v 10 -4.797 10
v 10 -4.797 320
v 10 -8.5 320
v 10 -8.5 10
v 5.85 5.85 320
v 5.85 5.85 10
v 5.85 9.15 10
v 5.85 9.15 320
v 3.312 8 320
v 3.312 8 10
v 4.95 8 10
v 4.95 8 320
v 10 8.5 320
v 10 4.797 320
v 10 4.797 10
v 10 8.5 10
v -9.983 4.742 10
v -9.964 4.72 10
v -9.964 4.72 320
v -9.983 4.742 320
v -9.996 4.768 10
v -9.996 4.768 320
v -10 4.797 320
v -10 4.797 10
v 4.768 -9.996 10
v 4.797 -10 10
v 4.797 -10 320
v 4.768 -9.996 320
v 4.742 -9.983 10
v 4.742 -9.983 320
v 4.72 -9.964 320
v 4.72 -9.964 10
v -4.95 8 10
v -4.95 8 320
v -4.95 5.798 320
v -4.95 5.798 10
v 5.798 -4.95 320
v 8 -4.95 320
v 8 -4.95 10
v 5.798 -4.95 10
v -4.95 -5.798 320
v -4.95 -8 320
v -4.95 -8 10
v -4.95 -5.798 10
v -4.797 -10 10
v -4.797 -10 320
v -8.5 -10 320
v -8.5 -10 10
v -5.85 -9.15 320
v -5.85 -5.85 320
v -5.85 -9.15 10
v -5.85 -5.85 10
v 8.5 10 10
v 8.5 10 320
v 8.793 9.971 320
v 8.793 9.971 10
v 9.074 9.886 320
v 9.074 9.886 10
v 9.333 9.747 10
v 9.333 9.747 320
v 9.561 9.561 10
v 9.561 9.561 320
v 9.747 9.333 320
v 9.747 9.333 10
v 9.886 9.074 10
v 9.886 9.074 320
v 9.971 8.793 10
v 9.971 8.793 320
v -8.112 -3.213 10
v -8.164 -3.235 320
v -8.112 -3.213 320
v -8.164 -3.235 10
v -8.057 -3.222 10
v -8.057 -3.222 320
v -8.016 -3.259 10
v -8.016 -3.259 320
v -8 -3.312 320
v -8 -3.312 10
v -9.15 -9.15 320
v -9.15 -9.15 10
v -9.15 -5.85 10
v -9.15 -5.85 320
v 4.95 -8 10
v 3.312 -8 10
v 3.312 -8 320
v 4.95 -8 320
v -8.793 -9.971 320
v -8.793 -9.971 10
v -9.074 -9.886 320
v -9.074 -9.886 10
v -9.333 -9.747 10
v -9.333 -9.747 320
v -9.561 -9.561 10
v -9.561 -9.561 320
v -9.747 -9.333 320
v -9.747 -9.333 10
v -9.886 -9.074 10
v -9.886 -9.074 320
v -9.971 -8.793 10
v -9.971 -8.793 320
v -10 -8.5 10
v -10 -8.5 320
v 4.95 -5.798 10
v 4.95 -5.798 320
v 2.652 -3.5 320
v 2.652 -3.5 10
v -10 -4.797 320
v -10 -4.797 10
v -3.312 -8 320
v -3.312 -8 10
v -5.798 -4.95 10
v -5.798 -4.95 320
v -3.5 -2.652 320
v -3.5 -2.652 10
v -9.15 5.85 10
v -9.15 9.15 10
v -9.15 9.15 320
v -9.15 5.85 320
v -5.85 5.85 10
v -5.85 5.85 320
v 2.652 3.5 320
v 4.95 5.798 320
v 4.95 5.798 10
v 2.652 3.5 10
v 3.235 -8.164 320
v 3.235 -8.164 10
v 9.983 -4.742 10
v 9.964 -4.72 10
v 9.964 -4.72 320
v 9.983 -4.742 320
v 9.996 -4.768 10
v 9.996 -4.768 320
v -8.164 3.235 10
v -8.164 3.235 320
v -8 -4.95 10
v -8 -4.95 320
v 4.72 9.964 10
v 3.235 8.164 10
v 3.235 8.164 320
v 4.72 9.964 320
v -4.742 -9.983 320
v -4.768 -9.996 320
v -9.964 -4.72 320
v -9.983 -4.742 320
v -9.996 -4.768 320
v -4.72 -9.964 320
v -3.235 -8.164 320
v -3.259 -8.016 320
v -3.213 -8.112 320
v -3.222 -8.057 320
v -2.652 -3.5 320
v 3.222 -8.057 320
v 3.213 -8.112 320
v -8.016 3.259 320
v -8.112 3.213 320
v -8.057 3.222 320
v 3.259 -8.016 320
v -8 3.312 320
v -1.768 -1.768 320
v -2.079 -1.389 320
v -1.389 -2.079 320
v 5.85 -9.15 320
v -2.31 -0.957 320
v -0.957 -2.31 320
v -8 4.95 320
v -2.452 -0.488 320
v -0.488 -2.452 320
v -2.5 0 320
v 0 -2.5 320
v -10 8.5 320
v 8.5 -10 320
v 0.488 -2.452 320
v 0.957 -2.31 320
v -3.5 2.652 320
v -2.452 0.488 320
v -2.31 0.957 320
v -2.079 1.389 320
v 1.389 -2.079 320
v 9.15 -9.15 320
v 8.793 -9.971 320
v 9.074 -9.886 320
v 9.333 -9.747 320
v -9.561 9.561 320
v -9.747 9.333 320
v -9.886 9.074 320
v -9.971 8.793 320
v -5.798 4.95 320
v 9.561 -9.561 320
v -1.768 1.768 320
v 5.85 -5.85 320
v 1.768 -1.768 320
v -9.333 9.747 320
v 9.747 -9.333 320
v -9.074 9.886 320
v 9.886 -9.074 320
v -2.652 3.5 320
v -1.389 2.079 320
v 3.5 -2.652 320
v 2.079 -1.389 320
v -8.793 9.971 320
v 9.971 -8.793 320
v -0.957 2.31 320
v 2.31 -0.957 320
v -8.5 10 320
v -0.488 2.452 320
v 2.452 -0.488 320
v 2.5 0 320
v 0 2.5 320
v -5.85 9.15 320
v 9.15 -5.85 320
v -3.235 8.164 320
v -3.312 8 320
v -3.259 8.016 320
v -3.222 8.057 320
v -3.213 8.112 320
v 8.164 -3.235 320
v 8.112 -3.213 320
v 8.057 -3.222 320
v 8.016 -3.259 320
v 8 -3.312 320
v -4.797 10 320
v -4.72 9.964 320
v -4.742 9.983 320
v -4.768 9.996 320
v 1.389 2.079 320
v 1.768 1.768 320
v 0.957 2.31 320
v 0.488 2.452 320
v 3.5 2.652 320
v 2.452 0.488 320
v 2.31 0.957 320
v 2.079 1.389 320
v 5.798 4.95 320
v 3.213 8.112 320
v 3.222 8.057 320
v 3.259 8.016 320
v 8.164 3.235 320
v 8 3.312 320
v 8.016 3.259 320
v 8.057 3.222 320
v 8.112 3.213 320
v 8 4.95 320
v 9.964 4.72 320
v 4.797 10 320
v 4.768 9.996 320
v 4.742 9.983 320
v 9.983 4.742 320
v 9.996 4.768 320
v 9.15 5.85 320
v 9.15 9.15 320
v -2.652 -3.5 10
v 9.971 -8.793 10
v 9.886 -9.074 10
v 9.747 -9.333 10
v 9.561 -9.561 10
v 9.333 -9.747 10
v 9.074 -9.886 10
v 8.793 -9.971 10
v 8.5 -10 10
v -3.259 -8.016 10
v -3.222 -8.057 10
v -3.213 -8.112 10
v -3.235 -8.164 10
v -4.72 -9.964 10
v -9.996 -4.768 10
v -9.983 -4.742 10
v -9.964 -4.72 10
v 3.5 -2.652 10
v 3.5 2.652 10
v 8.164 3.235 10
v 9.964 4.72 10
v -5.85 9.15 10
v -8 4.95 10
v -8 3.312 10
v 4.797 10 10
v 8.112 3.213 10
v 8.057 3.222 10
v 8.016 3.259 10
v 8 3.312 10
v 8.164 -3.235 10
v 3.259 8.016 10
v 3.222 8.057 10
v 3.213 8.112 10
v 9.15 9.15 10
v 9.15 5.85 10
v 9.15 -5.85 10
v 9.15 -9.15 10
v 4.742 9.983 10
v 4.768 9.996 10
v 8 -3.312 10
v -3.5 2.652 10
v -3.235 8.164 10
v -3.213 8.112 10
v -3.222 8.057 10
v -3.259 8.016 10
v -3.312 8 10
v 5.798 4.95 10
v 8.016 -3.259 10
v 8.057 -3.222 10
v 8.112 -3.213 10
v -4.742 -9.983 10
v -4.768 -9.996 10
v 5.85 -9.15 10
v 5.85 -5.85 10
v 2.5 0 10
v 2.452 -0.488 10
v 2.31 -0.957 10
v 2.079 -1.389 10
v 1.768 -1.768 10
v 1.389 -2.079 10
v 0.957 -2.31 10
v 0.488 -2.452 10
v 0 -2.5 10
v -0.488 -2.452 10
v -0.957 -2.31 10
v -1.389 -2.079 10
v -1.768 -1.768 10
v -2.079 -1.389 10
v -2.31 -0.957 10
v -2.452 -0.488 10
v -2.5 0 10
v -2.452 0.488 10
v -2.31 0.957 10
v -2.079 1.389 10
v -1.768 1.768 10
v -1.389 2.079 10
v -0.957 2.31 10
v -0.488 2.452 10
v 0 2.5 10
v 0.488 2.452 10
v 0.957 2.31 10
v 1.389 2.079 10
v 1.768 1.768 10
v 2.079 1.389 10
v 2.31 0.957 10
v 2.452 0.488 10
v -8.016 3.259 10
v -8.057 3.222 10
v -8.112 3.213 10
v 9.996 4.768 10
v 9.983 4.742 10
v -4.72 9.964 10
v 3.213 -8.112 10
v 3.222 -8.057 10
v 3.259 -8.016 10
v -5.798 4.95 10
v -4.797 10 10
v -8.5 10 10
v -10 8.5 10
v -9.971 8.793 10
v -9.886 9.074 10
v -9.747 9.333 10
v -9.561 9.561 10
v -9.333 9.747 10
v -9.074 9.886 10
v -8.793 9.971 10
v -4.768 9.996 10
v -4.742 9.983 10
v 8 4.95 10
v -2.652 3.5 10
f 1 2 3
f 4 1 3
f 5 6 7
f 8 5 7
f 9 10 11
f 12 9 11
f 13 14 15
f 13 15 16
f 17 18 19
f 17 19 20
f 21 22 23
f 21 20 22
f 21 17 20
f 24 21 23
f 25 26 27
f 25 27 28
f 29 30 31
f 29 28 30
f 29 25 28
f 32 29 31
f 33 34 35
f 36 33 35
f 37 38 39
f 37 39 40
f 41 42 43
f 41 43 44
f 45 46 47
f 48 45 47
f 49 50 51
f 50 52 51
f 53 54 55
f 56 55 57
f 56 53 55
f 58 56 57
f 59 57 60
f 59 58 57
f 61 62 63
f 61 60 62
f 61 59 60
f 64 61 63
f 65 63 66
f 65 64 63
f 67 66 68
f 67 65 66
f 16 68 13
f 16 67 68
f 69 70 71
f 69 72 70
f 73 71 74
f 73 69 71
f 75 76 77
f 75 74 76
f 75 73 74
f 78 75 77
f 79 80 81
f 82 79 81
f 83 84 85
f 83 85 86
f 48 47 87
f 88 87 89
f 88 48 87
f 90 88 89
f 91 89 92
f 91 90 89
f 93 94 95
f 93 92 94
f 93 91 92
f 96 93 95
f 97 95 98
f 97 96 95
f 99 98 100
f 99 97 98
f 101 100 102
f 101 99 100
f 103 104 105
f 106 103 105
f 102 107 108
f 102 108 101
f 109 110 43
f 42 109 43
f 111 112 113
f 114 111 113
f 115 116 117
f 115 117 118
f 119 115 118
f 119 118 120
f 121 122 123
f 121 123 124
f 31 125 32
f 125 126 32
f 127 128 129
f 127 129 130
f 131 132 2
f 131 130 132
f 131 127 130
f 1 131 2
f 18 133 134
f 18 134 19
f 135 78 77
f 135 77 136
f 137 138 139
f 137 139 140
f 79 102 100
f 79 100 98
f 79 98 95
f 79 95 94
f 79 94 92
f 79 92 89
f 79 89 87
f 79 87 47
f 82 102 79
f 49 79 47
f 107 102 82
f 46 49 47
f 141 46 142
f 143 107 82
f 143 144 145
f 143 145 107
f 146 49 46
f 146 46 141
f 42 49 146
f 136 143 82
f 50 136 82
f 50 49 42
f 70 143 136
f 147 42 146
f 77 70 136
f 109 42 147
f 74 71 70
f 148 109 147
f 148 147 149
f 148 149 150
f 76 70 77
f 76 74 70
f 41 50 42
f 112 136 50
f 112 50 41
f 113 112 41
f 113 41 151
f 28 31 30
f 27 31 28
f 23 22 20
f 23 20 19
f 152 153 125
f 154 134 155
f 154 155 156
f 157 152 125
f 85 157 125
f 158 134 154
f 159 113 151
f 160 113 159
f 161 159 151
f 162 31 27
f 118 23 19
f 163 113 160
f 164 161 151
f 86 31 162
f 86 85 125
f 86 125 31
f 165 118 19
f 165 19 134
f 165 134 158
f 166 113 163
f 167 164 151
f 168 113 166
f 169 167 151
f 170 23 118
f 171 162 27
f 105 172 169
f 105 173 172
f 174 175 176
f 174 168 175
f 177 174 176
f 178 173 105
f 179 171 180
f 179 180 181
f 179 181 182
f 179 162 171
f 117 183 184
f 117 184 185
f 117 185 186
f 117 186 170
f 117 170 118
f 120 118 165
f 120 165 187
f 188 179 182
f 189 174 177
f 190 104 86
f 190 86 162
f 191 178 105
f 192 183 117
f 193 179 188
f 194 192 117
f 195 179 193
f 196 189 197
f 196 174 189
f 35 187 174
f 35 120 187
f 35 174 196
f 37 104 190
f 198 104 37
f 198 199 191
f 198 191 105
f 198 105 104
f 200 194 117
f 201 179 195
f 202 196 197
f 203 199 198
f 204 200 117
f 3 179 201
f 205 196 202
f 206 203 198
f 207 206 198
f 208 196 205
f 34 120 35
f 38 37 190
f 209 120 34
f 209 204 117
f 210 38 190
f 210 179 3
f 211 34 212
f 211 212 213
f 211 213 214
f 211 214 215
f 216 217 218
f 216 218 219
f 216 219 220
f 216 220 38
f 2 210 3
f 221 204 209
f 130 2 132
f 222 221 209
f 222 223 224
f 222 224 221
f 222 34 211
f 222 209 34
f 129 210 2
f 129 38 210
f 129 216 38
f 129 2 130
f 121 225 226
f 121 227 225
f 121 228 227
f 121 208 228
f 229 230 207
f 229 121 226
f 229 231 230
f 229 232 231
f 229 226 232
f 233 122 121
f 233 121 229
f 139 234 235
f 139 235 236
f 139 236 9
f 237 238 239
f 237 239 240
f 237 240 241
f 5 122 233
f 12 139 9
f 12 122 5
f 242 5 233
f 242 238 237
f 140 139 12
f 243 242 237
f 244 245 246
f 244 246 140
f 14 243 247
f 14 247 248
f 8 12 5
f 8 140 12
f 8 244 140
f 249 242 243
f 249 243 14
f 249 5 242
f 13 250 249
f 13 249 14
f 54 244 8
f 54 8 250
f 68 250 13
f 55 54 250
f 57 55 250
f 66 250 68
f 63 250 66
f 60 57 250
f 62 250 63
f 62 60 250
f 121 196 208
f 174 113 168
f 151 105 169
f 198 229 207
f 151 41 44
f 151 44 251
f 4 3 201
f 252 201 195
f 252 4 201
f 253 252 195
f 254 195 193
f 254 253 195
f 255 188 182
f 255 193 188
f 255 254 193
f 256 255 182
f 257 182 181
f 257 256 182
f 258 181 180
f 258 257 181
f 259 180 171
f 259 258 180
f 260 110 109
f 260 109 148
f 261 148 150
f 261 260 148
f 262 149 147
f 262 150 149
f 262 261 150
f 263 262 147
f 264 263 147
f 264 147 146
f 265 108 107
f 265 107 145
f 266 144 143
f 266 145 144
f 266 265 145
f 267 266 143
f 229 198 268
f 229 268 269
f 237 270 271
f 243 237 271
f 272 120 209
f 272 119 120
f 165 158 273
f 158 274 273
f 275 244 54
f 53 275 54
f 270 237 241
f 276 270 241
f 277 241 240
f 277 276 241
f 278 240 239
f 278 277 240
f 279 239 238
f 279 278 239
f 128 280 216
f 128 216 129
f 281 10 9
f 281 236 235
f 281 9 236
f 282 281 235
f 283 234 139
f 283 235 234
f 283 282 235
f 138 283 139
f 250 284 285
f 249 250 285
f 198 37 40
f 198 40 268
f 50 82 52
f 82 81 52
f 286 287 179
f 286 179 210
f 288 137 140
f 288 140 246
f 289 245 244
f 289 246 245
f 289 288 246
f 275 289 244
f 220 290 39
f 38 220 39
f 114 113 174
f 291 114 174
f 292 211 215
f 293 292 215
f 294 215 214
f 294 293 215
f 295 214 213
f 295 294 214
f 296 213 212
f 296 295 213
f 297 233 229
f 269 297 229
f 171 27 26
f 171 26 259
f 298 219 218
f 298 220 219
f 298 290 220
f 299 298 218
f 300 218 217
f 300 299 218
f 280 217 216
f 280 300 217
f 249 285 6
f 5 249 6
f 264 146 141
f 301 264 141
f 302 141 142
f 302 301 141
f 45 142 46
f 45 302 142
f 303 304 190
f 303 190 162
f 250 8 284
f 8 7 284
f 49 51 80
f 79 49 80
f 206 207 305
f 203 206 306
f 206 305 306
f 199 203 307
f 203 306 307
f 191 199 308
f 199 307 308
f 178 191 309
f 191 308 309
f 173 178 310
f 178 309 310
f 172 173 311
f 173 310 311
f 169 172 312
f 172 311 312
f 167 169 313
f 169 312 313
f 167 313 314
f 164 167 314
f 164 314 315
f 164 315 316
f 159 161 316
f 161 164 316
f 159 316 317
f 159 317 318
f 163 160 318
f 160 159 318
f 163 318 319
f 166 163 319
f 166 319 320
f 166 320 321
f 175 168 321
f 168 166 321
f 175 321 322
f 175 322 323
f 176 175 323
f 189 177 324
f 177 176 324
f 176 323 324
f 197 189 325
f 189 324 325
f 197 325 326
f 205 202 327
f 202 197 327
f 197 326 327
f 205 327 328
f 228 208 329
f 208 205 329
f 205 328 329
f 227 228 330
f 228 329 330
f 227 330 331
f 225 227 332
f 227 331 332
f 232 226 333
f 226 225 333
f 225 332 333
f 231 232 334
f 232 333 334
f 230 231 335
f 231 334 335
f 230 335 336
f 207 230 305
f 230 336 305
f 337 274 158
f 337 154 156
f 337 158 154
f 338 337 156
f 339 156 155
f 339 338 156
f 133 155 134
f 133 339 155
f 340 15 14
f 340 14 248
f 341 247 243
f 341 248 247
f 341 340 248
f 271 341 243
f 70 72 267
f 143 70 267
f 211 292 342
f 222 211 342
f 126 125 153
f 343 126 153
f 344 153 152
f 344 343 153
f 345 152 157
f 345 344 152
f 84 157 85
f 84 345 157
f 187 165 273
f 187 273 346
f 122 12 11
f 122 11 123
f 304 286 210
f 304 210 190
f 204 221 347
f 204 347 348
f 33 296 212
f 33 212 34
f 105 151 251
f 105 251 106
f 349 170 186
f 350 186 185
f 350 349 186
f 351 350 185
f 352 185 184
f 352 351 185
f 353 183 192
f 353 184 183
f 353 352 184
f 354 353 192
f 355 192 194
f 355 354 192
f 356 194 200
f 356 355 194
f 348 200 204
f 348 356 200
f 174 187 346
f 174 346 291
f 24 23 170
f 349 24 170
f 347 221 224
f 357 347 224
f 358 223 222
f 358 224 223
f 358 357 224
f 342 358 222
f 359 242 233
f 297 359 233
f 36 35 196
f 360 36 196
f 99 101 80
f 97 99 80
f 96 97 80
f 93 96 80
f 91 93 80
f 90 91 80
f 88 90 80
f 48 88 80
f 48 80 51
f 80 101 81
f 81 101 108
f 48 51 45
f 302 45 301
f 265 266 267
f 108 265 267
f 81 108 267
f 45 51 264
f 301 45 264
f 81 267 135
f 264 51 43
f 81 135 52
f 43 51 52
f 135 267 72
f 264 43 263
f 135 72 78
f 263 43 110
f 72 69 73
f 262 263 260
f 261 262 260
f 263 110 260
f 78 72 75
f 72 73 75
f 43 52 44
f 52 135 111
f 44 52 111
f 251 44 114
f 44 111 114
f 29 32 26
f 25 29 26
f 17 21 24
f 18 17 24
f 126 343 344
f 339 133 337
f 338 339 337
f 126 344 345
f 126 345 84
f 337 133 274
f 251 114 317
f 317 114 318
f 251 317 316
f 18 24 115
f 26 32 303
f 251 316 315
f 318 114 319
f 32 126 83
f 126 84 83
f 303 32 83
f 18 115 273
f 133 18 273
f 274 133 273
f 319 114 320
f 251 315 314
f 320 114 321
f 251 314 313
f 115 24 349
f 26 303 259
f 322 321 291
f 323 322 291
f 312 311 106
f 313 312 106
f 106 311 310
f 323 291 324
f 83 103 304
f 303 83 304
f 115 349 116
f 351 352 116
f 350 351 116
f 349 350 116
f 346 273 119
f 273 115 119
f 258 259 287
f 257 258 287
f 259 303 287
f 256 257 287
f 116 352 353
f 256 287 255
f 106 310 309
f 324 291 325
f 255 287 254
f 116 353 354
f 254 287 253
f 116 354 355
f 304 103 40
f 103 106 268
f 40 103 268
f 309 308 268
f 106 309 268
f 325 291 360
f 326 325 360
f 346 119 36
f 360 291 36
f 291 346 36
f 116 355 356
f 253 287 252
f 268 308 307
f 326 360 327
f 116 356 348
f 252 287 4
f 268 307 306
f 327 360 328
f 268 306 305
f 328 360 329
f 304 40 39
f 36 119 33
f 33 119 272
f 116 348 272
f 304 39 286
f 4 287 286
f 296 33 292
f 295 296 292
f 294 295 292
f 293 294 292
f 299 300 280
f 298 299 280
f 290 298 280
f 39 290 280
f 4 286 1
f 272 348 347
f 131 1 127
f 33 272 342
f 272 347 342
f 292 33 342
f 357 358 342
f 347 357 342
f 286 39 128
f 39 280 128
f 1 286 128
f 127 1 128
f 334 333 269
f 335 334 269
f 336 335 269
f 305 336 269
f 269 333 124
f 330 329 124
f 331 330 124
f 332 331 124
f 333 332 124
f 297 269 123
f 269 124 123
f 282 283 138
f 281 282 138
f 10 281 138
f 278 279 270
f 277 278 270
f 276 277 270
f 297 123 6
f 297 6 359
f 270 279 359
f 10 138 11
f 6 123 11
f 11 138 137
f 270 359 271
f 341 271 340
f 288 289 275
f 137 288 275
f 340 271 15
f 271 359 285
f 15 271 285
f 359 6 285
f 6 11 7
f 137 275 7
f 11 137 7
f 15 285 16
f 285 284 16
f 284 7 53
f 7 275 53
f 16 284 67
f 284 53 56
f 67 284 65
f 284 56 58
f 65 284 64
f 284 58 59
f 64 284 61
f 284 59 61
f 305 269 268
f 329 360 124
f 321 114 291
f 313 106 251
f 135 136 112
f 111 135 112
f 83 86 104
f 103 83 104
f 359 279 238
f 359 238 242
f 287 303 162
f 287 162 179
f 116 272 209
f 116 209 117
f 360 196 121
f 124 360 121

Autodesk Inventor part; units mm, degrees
ref_plane "Начальная плоскость" through (0, 0, 10) normal (0, 0, 1) x (1, 0, 0)
ref_plane "Конечная плоскость" through (0, 0, 320) normal (0, 0, 1) x (1, 0, 0)
sketch "Эскиз" plane through (0, 0, 0) normal (0, 0, 1) x (1, 0, 0)
  line L0 (-14.4349, 0) -> (14.4349, 0) projected
  line L1 (0, -14) -> (0, 14) projected
  line L2 (0, 0) -> (7.5, 7.5) construction
  circle A0 centre (7.5, 7.5) radius 1.65 construction
  line L3 (5.85, 9.15) -> (9.15, 9.15)
  line L4 (9.15, 9.15) -> (9.15, 5.85)
  line L5 (9.15, 5.85) -> (5.85, 5.85)
  line L6 (5.85, 5.85) -> (5.85, 9.15)
  line L7 (3.235, 8.1636) -> (4.72, 9.9636)
  line L8 (4.7971, 10) -> (8.5, 10)
  line L9 (3.3121, 8) -> (4.95, 8)
  line L10 (4.95, 8) -> (4.95, 5.7985)
  line L11 (4.95, 5.7985) -> (2.6515, 3.5)
  line L12 (0, 3.5) -> (2.6515, 3.5)
  circle A1 centre (0, 0) radius 2.5
  line L13 (8.1636, 3.235) -> (9.9636, 4.72)
  line L14 (10, 4.7971) -> (10, 8.5)
  line L15 (8, 3.3121) -> (8, 4.95)
  line L16 (8, 4.95) -> (5.7985, 4.95)
  line L17 (5.7985, 4.95) -> (3.5, 2.6515)
  line L18 (3.5, 0) -> (3.5, 2.6515)
  arc A2 (10, 8.5) -> (8.5, 10) centre (8.5, 8.5) ccw
  line L19 (0, 0) -> (-7.5, 7.5) construction
  circle A3 centre (-7.5, 7.5) radius 1.65 construction
  line L20 (-5.85, 9.15) -> (-9.15, 9.15)
  line L21 (-9.15, 9.15) -> (-9.15, 5.85)
  line L22 (-9.15, 5.85) -> (-5.85, 5.85)
  line L23 (-5.85, 5.85) -> (-5.85, 9.15)
  line L24 (-3.235, 8.1636) -> (-4.72, 9.9636)
  line L25 (-4.7971, 10) -> (-8.5, 10)
  line L26 (-3.3121, 8) -> (-4.95, 8)
  line L27 (-4.95, 8) -> (-4.95, 5.7985)
  line L28 (-4.95, 5.7985) -> (-2.6515, 3.5)
  line L29 (0, 3.5) -> (-2.6515, 3.5)
  line L30 (-3.5, 0) -> (-3.5, 2.6515)
  line L31 (-5.7985, 4.95) -> (-3.5, 2.6515)
  line L32 (-8, 4.95) -> (-5.7985, 4.95)
  line L33 (-8, 3.3121) -> (-8, 4.95)
  line L34 (-8.1636, 3.235) -> (-9.9636, 4.72)
  line L35 (-10, 4.7971) -> (-10, 8.5)
  arc A4 (-8.5, 10) -> (-10, 8.5) centre (-8.5, 8.5) ccw
  line L36 (0, 14) -> (0, -14)
  line L37 (0, 0) -> (7.5, -7.5) construction
  circle A5 centre (7.5, -7.5) radius 1.65 construction
  line L38 (5.85, -9.15) -> (9.15, -9.15)
  line L39 (9.15, -9.15) -> (9.15, -5.85)
  line L40 (9.15, -5.85) -> (5.85, -5.85)
  line L41 (5.85, -5.85) -> (5.85, -9.15)
  line L42 (3.235, -8.1636) -> (4.72, -9.9636)
  line L43 (4.7971, -10) -> (8.5, -10)
  line L44 (3.3121, -8) -> (4.95, -8)
  line L45 (4.95, -8) -> (4.95, -5.7985)
  line L46 (4.95, -5.7985) -> (2.6515, -3.5)
  line L47 (0, -3.5) -> (2.6515, -3.5)
  line L48 (3.5, 0) -> (3.5, -2.6515)
  line L49 (5.7985, -4.95) -> (3.5, -2.6515)
  line L50 (8, -4.95) -> (5.7985, -4.95)
  line L51 (8, -3.3121) -> (8, -4.95)
  line L52 (8.1636, -3.235) -> (9.9636, -4.72)
  line L53 (10, -4.7971) -> (10, -8.5)
  arc A6 (8.5, -10) -> (10, -8.5) centre (8.5, -8.5) ccw
  line L54 (0, 0) -> (-7.5, -7.5) construction
  line L55 (-4.95, -8) -> (-4.95, -5.7985)
  line L56 (-3.3121, -8) -> (-4.95, -8)
  line L57 (-5.7985, -4.95) -> (-3.5, -2.6515)
  line L58 (-4.95, -5.7985) -> (-2.6515, -3.5)
  line L59 (-3.5, 0) -> (-3.5, -2.6515)
  line L60 (0, -3.5) -> (-2.6515, -3.5)
  circle A7 centre (-7.5, -7.5) radius 1.65 construction
  line L61 (-5.85, -5.85) -> (-5.85, -9.15)
  line L62 (-5.85, -9.15) -> (-9.15, -9.15)
  line L63 (-9.15, -9.15) -> (-9.15, -5.85)
  line L64 (-9.15, -5.85) -> (-5.85, -5.85)
  line L65 (-3.235, -8.1636) -> (-4.72, -9.9636)
  line L66 (-8, -4.95) -> (-5.7985, -4.95)
  line L67 (-8, -3.3121) -> (-8, -4.95)
  line L68 (-8.1636, -3.235) -> (-9.9636, -4.72)
  line L69 (-4.7971, -10) -> (-8.5, -10)
  line L70 (-10, -4.7971) -> (-10, -8.5)
  arc A8 (-10, -8.5) -> (-8.5, -10) centre (-8.5, -8.5) ccw
  arc A9 (3.235, 8.1636) -> (3.3121, 8) centre (3.3121, 8.1) ccw
  arc A10 (4.7971, 10) -> (4.72, 9.9636) centre (4.7971, 9.9) ccw
  arc A11 (8, 3.3121) -> (8.1636, 3.235) centre (8.1, 3.3121) ccw
  arc A12 (9.9636, 4.72) -> (10, 4.7971) centre (9.9, 4.7971) ccw
  arc A13 (-3.3121, 8) -> (-3.235, 8.1636) centre (-3.3121, 8.1) ccw
  arc A14 (-4.72, 9.9636) -> (-4.7971, 10) centre (-4.7971, 9.9) ccw
  arc A15 (-8.1636, 3.235) -> (-8, 3.3121) centre (-8.1, 3.3121) ccw
  arc A16 (-10, 4.7971) -> (-9.9636, 4.72) centre (-9.9, 4.7971) ccw
  arc A17 (-8, -3.3121) -> (-8.1636, -3.235) centre (-8.1, -3.3121) ccw
  arc A18 (-9.9636, -4.72) -> (-10, -4.7971) centre (-9.9, -4.7971) ccw
  arc A19 (-3.235, -8.1636) -> (-3.3121, -8) centre (-3.3121, -8.1) ccw
  arc A20 (-4.7971, -10) -> (-4.72, -9.9636) centre (-4.7971, -9.9) ccw
  arc A21 (4.72, -9.9636) -> (4.7971, -10) centre (4.7971, -9.9) ccw
  arc A22 (3.3121, -8) -> (3.235, -8.1636) centre (3.3121, -8.1) ccw
  arc A23 (8.1636, -3.235) -> (8, -3.3121) centre (8.1, -3.3121) ccw
  arc A24 (10, -4.7971) -> (9.9636, -4.72) centre (9.9, -4.7971) ccw
  point P0 (3.1, 8)
  point P1 (4.75, 10)
  point P2 (7.5, 9.15)
  point P3 (8, 3.1)
  point P4 (10, 4.75)
  point P5 (7.5, 5.85)
  point P6 (9.15, 7.5)
  point P7 (-3.1, 8)
  point P8 (-4.75, 10)
  point P9 (-7.5, 9.15)
  point P10 (-8, 3.1)
  point P11 (-10, 4.75)
  point P12 (-7.5, 5.85)
  point P13 (-9.15, 7.5)
  point P14 (3.1, -8)
  point P15 (4.75, -10)
  point P16 (7.5, -9.15)
  point P17 (8, -3.1)
  point P18 (10, -4.75)
  point P19 (7.5, -5.85)
  point P20 (9.15, -7.5)
  point P21 (-3.1, -8)
  point P22 (-7.5, -5.85)
  point P23 (-7.5, -9.15)
  point P24 (-9.15, -7.5)
  point P25 (-4.75, -10)
  point P26 (-8, -3.1)
  point P27 (-10, -4.75)
  dimension "d0" = 45
  dimension "d1" = 3.3
  dimension "d2" = 1.5
  dimension "d3" = 1.2
  dimension "d4" = 5
  dimension "d5" = 6.5
  dimension "d6" = 15
  dimension "d7" = 20
  dimension "d8" = 9.9
  dimension "d9" = 9.5
  dimension "d10" = 6.2
  dimension "d11" = 2
  dimension "d18" = 0.1
  dimension "d19" = 0.1
extrude "Тело" add sketch "Эскиз" along normal up to surface (310 mm away) from surface at 10 contours A1 L1 L12 L11 L10 L9 A9 L7 A10 L8 A2 L14 A12 L13 A11 L15 L16 L17 L18 L0 | L0 L48 L49 L50 L51 A23 L52 A24 L53 A6 L43 A21 L42 A22 L44 L45 L46 L47 L1 A1 | A1 L0 L30 L31 L32 L33 A15 L34 A16 L35 A4 L25 A14 L24 A13 L26 L27 L28 L29 L1 | L1 L60 L58 L55 L56 A19 L65 A20 L69 A8 L70 A18 L68 A17 L67 L66 L57 L59 L0 A1
sketch "Эскиз2" plane through (0, 0, 0) normal (0, 0, 1) x (1, 0, 0)
  line L0 (0, 0) -> (10, 0)
ref_plane "РабПлоскость3" through (0, 0, 0) normal (0, -1, 0) x (1, 0, 0)
sketch "Эскиз3" plane through (0, 0, 0) normal (0, -1, 0) x (1, 0, 0)
  line L0 (-2, 10) -> (12, 10)
  line L1 (-2, 320) -> (12, 320)
  dimension "d25" = 310
ref_plane "РабПлоскость4" through (-255, -8.5, 320) normal (0, 0, 1) x (1, 0, 0)
split "Разделение1" plane through (-255, -8.5, 320) removes the side toward (0, 0, 1)
ref_plane "РабПлоскость5" through (-300, 8.5, 10) normal (0, 0, -1) x (-1, 0, 0)
split "Разделение2" plane through (-300, 8.5, 10) removes the side toward (0, 0, -1)
properties part number "короткая палка" material "Алюминий 6061"
